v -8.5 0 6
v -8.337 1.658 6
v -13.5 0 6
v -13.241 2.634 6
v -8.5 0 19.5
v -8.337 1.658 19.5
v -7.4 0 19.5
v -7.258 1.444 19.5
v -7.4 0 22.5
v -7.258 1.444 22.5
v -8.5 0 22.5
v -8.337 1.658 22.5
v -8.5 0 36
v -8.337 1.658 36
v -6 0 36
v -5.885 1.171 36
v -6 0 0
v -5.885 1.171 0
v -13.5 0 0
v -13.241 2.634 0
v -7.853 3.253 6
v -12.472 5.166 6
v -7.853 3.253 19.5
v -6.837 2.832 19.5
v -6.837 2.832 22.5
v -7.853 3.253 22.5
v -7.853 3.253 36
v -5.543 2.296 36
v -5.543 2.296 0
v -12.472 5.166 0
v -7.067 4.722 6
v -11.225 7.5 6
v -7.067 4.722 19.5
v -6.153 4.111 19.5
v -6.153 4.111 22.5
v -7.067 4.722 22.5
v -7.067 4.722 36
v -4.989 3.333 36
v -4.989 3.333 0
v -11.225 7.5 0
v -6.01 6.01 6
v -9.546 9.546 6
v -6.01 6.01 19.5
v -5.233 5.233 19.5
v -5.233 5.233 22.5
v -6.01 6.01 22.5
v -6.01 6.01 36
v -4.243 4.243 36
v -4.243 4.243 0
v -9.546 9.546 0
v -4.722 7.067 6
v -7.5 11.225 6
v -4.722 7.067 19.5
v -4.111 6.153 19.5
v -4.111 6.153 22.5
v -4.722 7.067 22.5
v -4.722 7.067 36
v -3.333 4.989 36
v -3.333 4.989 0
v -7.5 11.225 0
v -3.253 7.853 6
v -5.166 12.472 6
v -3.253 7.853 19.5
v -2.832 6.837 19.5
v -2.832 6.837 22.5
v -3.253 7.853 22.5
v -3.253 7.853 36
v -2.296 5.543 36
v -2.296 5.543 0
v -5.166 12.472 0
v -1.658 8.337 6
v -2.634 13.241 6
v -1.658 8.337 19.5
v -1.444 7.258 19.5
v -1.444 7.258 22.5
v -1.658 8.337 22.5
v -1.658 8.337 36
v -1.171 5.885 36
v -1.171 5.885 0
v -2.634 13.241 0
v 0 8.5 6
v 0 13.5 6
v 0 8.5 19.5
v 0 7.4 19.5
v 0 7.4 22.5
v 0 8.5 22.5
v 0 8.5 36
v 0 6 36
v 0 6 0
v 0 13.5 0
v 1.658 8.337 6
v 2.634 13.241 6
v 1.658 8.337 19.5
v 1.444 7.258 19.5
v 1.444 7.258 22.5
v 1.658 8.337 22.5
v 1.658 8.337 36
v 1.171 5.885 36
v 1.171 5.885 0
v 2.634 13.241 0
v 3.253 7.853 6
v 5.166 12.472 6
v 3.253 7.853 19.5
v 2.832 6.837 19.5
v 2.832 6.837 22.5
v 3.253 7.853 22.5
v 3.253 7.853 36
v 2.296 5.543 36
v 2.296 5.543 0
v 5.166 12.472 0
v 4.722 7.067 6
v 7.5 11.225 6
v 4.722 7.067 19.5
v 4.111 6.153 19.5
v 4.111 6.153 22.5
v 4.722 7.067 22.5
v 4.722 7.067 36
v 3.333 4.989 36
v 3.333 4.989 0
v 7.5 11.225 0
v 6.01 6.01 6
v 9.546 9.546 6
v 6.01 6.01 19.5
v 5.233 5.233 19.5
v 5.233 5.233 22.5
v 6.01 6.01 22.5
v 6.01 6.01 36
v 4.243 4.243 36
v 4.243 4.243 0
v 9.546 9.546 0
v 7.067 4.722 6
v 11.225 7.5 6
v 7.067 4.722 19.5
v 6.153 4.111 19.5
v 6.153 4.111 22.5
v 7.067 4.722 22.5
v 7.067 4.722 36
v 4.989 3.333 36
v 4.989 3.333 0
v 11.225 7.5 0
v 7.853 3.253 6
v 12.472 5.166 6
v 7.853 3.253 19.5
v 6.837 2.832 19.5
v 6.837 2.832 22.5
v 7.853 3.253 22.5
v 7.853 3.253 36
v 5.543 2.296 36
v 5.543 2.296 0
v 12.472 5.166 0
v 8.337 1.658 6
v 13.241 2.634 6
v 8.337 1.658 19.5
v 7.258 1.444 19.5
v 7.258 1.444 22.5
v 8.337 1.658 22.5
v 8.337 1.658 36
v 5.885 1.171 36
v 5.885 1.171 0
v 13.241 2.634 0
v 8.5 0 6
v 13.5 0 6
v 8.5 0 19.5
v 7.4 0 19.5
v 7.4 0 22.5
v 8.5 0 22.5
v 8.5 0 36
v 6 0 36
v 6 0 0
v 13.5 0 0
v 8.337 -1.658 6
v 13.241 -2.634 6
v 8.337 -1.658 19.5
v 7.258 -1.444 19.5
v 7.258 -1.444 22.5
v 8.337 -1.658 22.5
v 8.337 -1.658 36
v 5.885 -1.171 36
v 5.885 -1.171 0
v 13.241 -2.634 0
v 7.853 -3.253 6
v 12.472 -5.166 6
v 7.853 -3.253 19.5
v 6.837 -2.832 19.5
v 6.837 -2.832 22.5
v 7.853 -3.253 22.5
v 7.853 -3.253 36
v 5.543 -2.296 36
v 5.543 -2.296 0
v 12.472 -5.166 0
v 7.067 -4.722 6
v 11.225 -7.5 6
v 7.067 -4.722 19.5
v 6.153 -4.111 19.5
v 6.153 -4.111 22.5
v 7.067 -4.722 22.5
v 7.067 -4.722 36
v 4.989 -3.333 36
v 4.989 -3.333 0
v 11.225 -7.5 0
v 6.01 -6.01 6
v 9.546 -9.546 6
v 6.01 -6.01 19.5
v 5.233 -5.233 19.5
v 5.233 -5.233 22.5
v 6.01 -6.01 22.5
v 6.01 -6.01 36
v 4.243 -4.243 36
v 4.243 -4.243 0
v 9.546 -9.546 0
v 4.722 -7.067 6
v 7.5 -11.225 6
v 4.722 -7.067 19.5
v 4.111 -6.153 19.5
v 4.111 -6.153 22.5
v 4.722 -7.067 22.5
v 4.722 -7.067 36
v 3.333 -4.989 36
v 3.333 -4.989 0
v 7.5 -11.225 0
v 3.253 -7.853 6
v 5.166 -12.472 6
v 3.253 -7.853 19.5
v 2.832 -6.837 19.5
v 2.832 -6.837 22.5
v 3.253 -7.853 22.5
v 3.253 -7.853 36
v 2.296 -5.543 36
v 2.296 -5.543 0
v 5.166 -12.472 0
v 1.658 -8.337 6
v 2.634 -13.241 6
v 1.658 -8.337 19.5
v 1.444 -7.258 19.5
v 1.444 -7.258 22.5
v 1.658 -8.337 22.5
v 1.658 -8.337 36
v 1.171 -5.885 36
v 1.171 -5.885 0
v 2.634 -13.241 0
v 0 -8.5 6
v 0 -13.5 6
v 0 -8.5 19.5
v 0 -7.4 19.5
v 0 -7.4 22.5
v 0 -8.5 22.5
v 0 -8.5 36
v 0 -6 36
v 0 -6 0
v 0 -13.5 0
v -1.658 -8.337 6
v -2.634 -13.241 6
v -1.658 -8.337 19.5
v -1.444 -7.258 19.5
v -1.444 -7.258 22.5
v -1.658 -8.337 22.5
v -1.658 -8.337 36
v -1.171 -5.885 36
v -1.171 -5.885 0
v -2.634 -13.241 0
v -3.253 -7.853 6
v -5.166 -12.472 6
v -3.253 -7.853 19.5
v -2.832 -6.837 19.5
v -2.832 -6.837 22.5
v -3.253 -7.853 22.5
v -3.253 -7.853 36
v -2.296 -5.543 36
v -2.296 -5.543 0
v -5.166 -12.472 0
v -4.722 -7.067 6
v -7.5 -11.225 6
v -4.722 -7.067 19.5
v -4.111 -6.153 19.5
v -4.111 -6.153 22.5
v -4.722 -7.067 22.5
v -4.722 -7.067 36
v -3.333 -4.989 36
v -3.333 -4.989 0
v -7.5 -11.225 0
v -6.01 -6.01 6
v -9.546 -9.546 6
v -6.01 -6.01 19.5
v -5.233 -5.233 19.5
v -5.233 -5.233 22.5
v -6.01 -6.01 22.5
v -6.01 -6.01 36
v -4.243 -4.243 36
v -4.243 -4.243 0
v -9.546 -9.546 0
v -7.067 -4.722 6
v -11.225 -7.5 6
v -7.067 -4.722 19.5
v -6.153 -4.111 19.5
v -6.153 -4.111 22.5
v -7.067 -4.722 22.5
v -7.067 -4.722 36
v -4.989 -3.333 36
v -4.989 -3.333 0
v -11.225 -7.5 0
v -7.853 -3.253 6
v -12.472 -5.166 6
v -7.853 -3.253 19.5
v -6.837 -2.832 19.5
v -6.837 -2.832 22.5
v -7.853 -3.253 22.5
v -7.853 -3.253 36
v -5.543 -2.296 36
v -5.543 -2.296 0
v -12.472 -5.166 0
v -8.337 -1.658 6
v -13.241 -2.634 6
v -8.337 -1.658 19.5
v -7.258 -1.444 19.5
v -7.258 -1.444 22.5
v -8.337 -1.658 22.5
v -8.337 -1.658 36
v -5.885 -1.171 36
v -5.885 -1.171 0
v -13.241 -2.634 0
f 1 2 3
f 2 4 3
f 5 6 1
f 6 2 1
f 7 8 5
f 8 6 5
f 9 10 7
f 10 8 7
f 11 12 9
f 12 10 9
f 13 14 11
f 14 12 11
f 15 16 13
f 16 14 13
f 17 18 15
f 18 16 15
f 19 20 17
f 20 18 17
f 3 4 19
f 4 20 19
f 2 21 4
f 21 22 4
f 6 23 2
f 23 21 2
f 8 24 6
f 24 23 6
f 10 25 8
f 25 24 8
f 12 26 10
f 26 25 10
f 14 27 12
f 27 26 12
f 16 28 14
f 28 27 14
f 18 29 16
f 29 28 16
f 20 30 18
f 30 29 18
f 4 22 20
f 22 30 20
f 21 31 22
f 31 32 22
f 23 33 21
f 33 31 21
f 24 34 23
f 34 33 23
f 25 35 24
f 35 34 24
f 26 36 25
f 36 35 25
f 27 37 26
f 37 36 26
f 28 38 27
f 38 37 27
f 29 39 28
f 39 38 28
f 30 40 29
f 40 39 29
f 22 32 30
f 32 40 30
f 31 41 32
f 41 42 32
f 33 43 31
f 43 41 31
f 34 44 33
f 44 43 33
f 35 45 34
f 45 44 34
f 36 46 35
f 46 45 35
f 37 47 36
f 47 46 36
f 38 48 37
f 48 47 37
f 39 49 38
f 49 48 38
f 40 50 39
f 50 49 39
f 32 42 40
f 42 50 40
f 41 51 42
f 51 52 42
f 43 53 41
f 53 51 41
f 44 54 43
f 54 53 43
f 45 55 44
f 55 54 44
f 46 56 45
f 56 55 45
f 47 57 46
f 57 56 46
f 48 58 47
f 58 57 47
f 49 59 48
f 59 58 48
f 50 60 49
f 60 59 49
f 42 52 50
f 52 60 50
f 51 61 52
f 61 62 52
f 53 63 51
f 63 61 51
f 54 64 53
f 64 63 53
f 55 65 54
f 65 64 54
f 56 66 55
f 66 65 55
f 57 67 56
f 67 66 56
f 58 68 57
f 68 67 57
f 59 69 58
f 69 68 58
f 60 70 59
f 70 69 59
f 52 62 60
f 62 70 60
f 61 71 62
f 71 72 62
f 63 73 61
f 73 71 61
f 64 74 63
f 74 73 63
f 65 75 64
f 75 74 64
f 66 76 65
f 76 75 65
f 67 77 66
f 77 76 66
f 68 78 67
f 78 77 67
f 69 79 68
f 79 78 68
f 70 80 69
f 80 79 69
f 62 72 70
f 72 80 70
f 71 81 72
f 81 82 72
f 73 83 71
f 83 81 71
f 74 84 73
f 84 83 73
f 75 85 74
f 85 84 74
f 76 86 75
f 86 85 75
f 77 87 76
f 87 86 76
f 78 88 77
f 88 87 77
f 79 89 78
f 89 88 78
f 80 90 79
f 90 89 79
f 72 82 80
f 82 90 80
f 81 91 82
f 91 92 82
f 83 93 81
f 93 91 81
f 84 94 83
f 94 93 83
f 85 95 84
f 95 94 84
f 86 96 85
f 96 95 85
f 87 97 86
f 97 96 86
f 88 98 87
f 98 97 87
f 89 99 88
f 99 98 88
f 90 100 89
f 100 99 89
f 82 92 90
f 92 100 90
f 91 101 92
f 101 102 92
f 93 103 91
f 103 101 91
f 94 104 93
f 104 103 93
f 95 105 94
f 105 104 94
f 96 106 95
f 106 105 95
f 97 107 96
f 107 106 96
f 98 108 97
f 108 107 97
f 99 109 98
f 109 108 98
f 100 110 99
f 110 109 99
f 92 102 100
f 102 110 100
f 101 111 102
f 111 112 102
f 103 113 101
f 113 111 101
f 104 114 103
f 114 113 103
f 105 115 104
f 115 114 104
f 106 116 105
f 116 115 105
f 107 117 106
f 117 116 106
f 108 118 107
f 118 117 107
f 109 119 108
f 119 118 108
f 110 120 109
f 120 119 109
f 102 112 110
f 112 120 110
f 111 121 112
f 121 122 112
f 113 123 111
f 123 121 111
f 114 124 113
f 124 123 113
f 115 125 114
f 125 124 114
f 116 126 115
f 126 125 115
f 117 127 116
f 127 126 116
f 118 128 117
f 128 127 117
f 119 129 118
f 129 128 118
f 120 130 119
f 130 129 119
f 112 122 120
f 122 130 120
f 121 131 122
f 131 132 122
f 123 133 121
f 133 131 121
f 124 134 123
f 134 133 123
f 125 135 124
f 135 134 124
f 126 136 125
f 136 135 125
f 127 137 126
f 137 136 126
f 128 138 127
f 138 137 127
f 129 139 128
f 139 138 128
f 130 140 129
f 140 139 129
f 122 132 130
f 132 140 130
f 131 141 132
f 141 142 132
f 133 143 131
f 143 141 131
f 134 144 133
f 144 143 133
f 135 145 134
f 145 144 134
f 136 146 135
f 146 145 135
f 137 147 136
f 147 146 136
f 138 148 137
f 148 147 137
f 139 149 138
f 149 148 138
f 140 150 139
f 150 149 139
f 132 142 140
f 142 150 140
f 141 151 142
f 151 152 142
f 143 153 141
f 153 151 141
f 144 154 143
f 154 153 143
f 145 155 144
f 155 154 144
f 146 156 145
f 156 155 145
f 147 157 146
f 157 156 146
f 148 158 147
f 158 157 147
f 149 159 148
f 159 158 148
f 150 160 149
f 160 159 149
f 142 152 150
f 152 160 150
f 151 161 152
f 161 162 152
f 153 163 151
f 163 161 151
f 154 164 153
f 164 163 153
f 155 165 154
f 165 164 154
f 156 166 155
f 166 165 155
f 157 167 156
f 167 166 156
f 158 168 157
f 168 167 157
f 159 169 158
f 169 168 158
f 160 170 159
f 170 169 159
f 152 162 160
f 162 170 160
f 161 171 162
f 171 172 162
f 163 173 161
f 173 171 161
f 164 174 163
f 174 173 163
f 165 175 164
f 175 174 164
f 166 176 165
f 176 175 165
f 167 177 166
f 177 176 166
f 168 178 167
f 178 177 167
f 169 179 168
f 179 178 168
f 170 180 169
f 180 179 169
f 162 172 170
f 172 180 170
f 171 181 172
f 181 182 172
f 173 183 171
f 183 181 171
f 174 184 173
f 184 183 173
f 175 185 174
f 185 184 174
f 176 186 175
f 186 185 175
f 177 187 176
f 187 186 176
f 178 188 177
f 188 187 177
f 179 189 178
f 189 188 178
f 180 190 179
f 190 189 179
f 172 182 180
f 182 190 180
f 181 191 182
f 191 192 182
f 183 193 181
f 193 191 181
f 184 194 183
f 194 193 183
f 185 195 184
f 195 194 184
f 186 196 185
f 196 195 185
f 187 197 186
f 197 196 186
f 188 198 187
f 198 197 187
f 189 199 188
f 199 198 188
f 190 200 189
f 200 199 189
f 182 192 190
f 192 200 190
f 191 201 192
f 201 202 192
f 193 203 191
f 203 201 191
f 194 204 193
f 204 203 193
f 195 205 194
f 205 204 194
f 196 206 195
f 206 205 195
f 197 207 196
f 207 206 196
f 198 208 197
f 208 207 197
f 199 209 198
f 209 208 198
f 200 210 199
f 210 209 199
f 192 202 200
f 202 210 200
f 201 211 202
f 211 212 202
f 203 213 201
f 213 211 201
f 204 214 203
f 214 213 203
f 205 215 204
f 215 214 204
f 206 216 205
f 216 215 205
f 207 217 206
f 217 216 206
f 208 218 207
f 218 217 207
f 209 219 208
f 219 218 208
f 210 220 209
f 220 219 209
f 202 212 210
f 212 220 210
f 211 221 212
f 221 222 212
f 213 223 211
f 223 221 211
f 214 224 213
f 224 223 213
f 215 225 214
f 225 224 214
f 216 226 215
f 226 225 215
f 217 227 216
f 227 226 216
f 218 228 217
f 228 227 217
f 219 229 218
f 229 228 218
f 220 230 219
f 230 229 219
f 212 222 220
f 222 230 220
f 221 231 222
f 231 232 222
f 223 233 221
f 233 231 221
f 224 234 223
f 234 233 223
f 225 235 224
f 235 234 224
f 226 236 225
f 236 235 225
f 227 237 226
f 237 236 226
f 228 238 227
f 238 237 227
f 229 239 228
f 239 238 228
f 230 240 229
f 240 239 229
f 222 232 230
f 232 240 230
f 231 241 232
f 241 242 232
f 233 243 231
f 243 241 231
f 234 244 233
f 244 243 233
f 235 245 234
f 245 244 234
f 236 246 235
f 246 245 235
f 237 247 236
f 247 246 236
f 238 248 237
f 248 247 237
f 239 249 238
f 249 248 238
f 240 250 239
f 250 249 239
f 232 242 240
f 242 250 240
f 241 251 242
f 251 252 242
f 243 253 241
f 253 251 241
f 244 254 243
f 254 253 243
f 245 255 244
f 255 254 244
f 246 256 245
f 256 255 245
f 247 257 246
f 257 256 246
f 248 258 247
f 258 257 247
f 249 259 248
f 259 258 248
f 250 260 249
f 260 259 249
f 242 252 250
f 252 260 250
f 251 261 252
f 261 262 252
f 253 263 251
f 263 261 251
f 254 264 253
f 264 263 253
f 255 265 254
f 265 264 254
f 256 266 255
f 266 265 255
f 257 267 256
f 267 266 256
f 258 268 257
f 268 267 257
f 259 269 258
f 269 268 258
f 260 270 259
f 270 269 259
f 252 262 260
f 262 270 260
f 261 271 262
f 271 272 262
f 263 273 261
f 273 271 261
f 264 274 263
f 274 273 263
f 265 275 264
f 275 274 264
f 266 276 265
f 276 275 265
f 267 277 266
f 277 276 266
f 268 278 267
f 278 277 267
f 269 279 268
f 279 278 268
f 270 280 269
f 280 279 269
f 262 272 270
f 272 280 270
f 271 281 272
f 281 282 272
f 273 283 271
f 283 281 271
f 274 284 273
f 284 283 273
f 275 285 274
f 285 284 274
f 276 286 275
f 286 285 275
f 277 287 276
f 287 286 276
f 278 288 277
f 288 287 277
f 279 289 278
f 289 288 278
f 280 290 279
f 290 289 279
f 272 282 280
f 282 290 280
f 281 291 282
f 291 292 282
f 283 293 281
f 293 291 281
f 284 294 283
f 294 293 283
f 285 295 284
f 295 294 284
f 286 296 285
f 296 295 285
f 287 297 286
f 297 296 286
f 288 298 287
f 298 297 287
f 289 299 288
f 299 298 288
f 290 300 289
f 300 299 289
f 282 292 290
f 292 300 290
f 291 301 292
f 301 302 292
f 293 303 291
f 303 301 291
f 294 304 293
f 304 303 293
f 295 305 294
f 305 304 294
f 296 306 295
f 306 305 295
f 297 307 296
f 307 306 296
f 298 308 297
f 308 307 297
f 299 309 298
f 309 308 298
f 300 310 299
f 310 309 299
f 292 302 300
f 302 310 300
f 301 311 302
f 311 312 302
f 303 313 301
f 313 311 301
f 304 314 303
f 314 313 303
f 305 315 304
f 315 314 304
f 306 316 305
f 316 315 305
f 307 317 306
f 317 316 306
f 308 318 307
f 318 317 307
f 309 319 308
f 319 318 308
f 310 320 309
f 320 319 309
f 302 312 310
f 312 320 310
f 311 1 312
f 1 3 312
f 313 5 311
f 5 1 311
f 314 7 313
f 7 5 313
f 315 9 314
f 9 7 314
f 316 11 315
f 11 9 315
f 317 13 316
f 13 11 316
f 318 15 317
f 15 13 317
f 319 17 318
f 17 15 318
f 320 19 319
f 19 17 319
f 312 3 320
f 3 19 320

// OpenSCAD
$fn = 32;

// ----------------------------------------------------------------------
// Grooved revolve: flanged, bore R6
// ----------------------------------------------------------------------

// --- parameters (mm) ---
bore_r = 6;               // bore radius
outer_r = 8.5;            // outer radius of the body
total_h = 36;             // overall height, Z
wall = 2.5;               // radial wall thickness
groove_w = 3;             // groove width
groove_d = 1.1;           // groove depth
grooves = 1;              // number of outer grooves
flange_r = 13.5;          // flange radius
flange_h = 6;             // flange height

bbox_x = 2 * flange_r;  // full diameter
bore_d = 2 * bore_r;  // bore diameter
body_d = 2 * outer_r;  // body diameter
flange_d = 2 * flange_r;  // flange diameter
revolve_angle = 360;  // full turn around the Z axis

profile = [[6, 0], [8.5, 0], [13.5, 0], [13.5, 6], [8.5, 6], [8.5, 19.5], [7.4, 19.5], [7.4, 22.5], [8.5, 22.5], [8.5, 36], [6, 36]];  // primary outline, 11 points, counter clockwise

// --- the one profile operation ---
rotate_extrude(angle = revolve_angle) polygon(points = profile);
